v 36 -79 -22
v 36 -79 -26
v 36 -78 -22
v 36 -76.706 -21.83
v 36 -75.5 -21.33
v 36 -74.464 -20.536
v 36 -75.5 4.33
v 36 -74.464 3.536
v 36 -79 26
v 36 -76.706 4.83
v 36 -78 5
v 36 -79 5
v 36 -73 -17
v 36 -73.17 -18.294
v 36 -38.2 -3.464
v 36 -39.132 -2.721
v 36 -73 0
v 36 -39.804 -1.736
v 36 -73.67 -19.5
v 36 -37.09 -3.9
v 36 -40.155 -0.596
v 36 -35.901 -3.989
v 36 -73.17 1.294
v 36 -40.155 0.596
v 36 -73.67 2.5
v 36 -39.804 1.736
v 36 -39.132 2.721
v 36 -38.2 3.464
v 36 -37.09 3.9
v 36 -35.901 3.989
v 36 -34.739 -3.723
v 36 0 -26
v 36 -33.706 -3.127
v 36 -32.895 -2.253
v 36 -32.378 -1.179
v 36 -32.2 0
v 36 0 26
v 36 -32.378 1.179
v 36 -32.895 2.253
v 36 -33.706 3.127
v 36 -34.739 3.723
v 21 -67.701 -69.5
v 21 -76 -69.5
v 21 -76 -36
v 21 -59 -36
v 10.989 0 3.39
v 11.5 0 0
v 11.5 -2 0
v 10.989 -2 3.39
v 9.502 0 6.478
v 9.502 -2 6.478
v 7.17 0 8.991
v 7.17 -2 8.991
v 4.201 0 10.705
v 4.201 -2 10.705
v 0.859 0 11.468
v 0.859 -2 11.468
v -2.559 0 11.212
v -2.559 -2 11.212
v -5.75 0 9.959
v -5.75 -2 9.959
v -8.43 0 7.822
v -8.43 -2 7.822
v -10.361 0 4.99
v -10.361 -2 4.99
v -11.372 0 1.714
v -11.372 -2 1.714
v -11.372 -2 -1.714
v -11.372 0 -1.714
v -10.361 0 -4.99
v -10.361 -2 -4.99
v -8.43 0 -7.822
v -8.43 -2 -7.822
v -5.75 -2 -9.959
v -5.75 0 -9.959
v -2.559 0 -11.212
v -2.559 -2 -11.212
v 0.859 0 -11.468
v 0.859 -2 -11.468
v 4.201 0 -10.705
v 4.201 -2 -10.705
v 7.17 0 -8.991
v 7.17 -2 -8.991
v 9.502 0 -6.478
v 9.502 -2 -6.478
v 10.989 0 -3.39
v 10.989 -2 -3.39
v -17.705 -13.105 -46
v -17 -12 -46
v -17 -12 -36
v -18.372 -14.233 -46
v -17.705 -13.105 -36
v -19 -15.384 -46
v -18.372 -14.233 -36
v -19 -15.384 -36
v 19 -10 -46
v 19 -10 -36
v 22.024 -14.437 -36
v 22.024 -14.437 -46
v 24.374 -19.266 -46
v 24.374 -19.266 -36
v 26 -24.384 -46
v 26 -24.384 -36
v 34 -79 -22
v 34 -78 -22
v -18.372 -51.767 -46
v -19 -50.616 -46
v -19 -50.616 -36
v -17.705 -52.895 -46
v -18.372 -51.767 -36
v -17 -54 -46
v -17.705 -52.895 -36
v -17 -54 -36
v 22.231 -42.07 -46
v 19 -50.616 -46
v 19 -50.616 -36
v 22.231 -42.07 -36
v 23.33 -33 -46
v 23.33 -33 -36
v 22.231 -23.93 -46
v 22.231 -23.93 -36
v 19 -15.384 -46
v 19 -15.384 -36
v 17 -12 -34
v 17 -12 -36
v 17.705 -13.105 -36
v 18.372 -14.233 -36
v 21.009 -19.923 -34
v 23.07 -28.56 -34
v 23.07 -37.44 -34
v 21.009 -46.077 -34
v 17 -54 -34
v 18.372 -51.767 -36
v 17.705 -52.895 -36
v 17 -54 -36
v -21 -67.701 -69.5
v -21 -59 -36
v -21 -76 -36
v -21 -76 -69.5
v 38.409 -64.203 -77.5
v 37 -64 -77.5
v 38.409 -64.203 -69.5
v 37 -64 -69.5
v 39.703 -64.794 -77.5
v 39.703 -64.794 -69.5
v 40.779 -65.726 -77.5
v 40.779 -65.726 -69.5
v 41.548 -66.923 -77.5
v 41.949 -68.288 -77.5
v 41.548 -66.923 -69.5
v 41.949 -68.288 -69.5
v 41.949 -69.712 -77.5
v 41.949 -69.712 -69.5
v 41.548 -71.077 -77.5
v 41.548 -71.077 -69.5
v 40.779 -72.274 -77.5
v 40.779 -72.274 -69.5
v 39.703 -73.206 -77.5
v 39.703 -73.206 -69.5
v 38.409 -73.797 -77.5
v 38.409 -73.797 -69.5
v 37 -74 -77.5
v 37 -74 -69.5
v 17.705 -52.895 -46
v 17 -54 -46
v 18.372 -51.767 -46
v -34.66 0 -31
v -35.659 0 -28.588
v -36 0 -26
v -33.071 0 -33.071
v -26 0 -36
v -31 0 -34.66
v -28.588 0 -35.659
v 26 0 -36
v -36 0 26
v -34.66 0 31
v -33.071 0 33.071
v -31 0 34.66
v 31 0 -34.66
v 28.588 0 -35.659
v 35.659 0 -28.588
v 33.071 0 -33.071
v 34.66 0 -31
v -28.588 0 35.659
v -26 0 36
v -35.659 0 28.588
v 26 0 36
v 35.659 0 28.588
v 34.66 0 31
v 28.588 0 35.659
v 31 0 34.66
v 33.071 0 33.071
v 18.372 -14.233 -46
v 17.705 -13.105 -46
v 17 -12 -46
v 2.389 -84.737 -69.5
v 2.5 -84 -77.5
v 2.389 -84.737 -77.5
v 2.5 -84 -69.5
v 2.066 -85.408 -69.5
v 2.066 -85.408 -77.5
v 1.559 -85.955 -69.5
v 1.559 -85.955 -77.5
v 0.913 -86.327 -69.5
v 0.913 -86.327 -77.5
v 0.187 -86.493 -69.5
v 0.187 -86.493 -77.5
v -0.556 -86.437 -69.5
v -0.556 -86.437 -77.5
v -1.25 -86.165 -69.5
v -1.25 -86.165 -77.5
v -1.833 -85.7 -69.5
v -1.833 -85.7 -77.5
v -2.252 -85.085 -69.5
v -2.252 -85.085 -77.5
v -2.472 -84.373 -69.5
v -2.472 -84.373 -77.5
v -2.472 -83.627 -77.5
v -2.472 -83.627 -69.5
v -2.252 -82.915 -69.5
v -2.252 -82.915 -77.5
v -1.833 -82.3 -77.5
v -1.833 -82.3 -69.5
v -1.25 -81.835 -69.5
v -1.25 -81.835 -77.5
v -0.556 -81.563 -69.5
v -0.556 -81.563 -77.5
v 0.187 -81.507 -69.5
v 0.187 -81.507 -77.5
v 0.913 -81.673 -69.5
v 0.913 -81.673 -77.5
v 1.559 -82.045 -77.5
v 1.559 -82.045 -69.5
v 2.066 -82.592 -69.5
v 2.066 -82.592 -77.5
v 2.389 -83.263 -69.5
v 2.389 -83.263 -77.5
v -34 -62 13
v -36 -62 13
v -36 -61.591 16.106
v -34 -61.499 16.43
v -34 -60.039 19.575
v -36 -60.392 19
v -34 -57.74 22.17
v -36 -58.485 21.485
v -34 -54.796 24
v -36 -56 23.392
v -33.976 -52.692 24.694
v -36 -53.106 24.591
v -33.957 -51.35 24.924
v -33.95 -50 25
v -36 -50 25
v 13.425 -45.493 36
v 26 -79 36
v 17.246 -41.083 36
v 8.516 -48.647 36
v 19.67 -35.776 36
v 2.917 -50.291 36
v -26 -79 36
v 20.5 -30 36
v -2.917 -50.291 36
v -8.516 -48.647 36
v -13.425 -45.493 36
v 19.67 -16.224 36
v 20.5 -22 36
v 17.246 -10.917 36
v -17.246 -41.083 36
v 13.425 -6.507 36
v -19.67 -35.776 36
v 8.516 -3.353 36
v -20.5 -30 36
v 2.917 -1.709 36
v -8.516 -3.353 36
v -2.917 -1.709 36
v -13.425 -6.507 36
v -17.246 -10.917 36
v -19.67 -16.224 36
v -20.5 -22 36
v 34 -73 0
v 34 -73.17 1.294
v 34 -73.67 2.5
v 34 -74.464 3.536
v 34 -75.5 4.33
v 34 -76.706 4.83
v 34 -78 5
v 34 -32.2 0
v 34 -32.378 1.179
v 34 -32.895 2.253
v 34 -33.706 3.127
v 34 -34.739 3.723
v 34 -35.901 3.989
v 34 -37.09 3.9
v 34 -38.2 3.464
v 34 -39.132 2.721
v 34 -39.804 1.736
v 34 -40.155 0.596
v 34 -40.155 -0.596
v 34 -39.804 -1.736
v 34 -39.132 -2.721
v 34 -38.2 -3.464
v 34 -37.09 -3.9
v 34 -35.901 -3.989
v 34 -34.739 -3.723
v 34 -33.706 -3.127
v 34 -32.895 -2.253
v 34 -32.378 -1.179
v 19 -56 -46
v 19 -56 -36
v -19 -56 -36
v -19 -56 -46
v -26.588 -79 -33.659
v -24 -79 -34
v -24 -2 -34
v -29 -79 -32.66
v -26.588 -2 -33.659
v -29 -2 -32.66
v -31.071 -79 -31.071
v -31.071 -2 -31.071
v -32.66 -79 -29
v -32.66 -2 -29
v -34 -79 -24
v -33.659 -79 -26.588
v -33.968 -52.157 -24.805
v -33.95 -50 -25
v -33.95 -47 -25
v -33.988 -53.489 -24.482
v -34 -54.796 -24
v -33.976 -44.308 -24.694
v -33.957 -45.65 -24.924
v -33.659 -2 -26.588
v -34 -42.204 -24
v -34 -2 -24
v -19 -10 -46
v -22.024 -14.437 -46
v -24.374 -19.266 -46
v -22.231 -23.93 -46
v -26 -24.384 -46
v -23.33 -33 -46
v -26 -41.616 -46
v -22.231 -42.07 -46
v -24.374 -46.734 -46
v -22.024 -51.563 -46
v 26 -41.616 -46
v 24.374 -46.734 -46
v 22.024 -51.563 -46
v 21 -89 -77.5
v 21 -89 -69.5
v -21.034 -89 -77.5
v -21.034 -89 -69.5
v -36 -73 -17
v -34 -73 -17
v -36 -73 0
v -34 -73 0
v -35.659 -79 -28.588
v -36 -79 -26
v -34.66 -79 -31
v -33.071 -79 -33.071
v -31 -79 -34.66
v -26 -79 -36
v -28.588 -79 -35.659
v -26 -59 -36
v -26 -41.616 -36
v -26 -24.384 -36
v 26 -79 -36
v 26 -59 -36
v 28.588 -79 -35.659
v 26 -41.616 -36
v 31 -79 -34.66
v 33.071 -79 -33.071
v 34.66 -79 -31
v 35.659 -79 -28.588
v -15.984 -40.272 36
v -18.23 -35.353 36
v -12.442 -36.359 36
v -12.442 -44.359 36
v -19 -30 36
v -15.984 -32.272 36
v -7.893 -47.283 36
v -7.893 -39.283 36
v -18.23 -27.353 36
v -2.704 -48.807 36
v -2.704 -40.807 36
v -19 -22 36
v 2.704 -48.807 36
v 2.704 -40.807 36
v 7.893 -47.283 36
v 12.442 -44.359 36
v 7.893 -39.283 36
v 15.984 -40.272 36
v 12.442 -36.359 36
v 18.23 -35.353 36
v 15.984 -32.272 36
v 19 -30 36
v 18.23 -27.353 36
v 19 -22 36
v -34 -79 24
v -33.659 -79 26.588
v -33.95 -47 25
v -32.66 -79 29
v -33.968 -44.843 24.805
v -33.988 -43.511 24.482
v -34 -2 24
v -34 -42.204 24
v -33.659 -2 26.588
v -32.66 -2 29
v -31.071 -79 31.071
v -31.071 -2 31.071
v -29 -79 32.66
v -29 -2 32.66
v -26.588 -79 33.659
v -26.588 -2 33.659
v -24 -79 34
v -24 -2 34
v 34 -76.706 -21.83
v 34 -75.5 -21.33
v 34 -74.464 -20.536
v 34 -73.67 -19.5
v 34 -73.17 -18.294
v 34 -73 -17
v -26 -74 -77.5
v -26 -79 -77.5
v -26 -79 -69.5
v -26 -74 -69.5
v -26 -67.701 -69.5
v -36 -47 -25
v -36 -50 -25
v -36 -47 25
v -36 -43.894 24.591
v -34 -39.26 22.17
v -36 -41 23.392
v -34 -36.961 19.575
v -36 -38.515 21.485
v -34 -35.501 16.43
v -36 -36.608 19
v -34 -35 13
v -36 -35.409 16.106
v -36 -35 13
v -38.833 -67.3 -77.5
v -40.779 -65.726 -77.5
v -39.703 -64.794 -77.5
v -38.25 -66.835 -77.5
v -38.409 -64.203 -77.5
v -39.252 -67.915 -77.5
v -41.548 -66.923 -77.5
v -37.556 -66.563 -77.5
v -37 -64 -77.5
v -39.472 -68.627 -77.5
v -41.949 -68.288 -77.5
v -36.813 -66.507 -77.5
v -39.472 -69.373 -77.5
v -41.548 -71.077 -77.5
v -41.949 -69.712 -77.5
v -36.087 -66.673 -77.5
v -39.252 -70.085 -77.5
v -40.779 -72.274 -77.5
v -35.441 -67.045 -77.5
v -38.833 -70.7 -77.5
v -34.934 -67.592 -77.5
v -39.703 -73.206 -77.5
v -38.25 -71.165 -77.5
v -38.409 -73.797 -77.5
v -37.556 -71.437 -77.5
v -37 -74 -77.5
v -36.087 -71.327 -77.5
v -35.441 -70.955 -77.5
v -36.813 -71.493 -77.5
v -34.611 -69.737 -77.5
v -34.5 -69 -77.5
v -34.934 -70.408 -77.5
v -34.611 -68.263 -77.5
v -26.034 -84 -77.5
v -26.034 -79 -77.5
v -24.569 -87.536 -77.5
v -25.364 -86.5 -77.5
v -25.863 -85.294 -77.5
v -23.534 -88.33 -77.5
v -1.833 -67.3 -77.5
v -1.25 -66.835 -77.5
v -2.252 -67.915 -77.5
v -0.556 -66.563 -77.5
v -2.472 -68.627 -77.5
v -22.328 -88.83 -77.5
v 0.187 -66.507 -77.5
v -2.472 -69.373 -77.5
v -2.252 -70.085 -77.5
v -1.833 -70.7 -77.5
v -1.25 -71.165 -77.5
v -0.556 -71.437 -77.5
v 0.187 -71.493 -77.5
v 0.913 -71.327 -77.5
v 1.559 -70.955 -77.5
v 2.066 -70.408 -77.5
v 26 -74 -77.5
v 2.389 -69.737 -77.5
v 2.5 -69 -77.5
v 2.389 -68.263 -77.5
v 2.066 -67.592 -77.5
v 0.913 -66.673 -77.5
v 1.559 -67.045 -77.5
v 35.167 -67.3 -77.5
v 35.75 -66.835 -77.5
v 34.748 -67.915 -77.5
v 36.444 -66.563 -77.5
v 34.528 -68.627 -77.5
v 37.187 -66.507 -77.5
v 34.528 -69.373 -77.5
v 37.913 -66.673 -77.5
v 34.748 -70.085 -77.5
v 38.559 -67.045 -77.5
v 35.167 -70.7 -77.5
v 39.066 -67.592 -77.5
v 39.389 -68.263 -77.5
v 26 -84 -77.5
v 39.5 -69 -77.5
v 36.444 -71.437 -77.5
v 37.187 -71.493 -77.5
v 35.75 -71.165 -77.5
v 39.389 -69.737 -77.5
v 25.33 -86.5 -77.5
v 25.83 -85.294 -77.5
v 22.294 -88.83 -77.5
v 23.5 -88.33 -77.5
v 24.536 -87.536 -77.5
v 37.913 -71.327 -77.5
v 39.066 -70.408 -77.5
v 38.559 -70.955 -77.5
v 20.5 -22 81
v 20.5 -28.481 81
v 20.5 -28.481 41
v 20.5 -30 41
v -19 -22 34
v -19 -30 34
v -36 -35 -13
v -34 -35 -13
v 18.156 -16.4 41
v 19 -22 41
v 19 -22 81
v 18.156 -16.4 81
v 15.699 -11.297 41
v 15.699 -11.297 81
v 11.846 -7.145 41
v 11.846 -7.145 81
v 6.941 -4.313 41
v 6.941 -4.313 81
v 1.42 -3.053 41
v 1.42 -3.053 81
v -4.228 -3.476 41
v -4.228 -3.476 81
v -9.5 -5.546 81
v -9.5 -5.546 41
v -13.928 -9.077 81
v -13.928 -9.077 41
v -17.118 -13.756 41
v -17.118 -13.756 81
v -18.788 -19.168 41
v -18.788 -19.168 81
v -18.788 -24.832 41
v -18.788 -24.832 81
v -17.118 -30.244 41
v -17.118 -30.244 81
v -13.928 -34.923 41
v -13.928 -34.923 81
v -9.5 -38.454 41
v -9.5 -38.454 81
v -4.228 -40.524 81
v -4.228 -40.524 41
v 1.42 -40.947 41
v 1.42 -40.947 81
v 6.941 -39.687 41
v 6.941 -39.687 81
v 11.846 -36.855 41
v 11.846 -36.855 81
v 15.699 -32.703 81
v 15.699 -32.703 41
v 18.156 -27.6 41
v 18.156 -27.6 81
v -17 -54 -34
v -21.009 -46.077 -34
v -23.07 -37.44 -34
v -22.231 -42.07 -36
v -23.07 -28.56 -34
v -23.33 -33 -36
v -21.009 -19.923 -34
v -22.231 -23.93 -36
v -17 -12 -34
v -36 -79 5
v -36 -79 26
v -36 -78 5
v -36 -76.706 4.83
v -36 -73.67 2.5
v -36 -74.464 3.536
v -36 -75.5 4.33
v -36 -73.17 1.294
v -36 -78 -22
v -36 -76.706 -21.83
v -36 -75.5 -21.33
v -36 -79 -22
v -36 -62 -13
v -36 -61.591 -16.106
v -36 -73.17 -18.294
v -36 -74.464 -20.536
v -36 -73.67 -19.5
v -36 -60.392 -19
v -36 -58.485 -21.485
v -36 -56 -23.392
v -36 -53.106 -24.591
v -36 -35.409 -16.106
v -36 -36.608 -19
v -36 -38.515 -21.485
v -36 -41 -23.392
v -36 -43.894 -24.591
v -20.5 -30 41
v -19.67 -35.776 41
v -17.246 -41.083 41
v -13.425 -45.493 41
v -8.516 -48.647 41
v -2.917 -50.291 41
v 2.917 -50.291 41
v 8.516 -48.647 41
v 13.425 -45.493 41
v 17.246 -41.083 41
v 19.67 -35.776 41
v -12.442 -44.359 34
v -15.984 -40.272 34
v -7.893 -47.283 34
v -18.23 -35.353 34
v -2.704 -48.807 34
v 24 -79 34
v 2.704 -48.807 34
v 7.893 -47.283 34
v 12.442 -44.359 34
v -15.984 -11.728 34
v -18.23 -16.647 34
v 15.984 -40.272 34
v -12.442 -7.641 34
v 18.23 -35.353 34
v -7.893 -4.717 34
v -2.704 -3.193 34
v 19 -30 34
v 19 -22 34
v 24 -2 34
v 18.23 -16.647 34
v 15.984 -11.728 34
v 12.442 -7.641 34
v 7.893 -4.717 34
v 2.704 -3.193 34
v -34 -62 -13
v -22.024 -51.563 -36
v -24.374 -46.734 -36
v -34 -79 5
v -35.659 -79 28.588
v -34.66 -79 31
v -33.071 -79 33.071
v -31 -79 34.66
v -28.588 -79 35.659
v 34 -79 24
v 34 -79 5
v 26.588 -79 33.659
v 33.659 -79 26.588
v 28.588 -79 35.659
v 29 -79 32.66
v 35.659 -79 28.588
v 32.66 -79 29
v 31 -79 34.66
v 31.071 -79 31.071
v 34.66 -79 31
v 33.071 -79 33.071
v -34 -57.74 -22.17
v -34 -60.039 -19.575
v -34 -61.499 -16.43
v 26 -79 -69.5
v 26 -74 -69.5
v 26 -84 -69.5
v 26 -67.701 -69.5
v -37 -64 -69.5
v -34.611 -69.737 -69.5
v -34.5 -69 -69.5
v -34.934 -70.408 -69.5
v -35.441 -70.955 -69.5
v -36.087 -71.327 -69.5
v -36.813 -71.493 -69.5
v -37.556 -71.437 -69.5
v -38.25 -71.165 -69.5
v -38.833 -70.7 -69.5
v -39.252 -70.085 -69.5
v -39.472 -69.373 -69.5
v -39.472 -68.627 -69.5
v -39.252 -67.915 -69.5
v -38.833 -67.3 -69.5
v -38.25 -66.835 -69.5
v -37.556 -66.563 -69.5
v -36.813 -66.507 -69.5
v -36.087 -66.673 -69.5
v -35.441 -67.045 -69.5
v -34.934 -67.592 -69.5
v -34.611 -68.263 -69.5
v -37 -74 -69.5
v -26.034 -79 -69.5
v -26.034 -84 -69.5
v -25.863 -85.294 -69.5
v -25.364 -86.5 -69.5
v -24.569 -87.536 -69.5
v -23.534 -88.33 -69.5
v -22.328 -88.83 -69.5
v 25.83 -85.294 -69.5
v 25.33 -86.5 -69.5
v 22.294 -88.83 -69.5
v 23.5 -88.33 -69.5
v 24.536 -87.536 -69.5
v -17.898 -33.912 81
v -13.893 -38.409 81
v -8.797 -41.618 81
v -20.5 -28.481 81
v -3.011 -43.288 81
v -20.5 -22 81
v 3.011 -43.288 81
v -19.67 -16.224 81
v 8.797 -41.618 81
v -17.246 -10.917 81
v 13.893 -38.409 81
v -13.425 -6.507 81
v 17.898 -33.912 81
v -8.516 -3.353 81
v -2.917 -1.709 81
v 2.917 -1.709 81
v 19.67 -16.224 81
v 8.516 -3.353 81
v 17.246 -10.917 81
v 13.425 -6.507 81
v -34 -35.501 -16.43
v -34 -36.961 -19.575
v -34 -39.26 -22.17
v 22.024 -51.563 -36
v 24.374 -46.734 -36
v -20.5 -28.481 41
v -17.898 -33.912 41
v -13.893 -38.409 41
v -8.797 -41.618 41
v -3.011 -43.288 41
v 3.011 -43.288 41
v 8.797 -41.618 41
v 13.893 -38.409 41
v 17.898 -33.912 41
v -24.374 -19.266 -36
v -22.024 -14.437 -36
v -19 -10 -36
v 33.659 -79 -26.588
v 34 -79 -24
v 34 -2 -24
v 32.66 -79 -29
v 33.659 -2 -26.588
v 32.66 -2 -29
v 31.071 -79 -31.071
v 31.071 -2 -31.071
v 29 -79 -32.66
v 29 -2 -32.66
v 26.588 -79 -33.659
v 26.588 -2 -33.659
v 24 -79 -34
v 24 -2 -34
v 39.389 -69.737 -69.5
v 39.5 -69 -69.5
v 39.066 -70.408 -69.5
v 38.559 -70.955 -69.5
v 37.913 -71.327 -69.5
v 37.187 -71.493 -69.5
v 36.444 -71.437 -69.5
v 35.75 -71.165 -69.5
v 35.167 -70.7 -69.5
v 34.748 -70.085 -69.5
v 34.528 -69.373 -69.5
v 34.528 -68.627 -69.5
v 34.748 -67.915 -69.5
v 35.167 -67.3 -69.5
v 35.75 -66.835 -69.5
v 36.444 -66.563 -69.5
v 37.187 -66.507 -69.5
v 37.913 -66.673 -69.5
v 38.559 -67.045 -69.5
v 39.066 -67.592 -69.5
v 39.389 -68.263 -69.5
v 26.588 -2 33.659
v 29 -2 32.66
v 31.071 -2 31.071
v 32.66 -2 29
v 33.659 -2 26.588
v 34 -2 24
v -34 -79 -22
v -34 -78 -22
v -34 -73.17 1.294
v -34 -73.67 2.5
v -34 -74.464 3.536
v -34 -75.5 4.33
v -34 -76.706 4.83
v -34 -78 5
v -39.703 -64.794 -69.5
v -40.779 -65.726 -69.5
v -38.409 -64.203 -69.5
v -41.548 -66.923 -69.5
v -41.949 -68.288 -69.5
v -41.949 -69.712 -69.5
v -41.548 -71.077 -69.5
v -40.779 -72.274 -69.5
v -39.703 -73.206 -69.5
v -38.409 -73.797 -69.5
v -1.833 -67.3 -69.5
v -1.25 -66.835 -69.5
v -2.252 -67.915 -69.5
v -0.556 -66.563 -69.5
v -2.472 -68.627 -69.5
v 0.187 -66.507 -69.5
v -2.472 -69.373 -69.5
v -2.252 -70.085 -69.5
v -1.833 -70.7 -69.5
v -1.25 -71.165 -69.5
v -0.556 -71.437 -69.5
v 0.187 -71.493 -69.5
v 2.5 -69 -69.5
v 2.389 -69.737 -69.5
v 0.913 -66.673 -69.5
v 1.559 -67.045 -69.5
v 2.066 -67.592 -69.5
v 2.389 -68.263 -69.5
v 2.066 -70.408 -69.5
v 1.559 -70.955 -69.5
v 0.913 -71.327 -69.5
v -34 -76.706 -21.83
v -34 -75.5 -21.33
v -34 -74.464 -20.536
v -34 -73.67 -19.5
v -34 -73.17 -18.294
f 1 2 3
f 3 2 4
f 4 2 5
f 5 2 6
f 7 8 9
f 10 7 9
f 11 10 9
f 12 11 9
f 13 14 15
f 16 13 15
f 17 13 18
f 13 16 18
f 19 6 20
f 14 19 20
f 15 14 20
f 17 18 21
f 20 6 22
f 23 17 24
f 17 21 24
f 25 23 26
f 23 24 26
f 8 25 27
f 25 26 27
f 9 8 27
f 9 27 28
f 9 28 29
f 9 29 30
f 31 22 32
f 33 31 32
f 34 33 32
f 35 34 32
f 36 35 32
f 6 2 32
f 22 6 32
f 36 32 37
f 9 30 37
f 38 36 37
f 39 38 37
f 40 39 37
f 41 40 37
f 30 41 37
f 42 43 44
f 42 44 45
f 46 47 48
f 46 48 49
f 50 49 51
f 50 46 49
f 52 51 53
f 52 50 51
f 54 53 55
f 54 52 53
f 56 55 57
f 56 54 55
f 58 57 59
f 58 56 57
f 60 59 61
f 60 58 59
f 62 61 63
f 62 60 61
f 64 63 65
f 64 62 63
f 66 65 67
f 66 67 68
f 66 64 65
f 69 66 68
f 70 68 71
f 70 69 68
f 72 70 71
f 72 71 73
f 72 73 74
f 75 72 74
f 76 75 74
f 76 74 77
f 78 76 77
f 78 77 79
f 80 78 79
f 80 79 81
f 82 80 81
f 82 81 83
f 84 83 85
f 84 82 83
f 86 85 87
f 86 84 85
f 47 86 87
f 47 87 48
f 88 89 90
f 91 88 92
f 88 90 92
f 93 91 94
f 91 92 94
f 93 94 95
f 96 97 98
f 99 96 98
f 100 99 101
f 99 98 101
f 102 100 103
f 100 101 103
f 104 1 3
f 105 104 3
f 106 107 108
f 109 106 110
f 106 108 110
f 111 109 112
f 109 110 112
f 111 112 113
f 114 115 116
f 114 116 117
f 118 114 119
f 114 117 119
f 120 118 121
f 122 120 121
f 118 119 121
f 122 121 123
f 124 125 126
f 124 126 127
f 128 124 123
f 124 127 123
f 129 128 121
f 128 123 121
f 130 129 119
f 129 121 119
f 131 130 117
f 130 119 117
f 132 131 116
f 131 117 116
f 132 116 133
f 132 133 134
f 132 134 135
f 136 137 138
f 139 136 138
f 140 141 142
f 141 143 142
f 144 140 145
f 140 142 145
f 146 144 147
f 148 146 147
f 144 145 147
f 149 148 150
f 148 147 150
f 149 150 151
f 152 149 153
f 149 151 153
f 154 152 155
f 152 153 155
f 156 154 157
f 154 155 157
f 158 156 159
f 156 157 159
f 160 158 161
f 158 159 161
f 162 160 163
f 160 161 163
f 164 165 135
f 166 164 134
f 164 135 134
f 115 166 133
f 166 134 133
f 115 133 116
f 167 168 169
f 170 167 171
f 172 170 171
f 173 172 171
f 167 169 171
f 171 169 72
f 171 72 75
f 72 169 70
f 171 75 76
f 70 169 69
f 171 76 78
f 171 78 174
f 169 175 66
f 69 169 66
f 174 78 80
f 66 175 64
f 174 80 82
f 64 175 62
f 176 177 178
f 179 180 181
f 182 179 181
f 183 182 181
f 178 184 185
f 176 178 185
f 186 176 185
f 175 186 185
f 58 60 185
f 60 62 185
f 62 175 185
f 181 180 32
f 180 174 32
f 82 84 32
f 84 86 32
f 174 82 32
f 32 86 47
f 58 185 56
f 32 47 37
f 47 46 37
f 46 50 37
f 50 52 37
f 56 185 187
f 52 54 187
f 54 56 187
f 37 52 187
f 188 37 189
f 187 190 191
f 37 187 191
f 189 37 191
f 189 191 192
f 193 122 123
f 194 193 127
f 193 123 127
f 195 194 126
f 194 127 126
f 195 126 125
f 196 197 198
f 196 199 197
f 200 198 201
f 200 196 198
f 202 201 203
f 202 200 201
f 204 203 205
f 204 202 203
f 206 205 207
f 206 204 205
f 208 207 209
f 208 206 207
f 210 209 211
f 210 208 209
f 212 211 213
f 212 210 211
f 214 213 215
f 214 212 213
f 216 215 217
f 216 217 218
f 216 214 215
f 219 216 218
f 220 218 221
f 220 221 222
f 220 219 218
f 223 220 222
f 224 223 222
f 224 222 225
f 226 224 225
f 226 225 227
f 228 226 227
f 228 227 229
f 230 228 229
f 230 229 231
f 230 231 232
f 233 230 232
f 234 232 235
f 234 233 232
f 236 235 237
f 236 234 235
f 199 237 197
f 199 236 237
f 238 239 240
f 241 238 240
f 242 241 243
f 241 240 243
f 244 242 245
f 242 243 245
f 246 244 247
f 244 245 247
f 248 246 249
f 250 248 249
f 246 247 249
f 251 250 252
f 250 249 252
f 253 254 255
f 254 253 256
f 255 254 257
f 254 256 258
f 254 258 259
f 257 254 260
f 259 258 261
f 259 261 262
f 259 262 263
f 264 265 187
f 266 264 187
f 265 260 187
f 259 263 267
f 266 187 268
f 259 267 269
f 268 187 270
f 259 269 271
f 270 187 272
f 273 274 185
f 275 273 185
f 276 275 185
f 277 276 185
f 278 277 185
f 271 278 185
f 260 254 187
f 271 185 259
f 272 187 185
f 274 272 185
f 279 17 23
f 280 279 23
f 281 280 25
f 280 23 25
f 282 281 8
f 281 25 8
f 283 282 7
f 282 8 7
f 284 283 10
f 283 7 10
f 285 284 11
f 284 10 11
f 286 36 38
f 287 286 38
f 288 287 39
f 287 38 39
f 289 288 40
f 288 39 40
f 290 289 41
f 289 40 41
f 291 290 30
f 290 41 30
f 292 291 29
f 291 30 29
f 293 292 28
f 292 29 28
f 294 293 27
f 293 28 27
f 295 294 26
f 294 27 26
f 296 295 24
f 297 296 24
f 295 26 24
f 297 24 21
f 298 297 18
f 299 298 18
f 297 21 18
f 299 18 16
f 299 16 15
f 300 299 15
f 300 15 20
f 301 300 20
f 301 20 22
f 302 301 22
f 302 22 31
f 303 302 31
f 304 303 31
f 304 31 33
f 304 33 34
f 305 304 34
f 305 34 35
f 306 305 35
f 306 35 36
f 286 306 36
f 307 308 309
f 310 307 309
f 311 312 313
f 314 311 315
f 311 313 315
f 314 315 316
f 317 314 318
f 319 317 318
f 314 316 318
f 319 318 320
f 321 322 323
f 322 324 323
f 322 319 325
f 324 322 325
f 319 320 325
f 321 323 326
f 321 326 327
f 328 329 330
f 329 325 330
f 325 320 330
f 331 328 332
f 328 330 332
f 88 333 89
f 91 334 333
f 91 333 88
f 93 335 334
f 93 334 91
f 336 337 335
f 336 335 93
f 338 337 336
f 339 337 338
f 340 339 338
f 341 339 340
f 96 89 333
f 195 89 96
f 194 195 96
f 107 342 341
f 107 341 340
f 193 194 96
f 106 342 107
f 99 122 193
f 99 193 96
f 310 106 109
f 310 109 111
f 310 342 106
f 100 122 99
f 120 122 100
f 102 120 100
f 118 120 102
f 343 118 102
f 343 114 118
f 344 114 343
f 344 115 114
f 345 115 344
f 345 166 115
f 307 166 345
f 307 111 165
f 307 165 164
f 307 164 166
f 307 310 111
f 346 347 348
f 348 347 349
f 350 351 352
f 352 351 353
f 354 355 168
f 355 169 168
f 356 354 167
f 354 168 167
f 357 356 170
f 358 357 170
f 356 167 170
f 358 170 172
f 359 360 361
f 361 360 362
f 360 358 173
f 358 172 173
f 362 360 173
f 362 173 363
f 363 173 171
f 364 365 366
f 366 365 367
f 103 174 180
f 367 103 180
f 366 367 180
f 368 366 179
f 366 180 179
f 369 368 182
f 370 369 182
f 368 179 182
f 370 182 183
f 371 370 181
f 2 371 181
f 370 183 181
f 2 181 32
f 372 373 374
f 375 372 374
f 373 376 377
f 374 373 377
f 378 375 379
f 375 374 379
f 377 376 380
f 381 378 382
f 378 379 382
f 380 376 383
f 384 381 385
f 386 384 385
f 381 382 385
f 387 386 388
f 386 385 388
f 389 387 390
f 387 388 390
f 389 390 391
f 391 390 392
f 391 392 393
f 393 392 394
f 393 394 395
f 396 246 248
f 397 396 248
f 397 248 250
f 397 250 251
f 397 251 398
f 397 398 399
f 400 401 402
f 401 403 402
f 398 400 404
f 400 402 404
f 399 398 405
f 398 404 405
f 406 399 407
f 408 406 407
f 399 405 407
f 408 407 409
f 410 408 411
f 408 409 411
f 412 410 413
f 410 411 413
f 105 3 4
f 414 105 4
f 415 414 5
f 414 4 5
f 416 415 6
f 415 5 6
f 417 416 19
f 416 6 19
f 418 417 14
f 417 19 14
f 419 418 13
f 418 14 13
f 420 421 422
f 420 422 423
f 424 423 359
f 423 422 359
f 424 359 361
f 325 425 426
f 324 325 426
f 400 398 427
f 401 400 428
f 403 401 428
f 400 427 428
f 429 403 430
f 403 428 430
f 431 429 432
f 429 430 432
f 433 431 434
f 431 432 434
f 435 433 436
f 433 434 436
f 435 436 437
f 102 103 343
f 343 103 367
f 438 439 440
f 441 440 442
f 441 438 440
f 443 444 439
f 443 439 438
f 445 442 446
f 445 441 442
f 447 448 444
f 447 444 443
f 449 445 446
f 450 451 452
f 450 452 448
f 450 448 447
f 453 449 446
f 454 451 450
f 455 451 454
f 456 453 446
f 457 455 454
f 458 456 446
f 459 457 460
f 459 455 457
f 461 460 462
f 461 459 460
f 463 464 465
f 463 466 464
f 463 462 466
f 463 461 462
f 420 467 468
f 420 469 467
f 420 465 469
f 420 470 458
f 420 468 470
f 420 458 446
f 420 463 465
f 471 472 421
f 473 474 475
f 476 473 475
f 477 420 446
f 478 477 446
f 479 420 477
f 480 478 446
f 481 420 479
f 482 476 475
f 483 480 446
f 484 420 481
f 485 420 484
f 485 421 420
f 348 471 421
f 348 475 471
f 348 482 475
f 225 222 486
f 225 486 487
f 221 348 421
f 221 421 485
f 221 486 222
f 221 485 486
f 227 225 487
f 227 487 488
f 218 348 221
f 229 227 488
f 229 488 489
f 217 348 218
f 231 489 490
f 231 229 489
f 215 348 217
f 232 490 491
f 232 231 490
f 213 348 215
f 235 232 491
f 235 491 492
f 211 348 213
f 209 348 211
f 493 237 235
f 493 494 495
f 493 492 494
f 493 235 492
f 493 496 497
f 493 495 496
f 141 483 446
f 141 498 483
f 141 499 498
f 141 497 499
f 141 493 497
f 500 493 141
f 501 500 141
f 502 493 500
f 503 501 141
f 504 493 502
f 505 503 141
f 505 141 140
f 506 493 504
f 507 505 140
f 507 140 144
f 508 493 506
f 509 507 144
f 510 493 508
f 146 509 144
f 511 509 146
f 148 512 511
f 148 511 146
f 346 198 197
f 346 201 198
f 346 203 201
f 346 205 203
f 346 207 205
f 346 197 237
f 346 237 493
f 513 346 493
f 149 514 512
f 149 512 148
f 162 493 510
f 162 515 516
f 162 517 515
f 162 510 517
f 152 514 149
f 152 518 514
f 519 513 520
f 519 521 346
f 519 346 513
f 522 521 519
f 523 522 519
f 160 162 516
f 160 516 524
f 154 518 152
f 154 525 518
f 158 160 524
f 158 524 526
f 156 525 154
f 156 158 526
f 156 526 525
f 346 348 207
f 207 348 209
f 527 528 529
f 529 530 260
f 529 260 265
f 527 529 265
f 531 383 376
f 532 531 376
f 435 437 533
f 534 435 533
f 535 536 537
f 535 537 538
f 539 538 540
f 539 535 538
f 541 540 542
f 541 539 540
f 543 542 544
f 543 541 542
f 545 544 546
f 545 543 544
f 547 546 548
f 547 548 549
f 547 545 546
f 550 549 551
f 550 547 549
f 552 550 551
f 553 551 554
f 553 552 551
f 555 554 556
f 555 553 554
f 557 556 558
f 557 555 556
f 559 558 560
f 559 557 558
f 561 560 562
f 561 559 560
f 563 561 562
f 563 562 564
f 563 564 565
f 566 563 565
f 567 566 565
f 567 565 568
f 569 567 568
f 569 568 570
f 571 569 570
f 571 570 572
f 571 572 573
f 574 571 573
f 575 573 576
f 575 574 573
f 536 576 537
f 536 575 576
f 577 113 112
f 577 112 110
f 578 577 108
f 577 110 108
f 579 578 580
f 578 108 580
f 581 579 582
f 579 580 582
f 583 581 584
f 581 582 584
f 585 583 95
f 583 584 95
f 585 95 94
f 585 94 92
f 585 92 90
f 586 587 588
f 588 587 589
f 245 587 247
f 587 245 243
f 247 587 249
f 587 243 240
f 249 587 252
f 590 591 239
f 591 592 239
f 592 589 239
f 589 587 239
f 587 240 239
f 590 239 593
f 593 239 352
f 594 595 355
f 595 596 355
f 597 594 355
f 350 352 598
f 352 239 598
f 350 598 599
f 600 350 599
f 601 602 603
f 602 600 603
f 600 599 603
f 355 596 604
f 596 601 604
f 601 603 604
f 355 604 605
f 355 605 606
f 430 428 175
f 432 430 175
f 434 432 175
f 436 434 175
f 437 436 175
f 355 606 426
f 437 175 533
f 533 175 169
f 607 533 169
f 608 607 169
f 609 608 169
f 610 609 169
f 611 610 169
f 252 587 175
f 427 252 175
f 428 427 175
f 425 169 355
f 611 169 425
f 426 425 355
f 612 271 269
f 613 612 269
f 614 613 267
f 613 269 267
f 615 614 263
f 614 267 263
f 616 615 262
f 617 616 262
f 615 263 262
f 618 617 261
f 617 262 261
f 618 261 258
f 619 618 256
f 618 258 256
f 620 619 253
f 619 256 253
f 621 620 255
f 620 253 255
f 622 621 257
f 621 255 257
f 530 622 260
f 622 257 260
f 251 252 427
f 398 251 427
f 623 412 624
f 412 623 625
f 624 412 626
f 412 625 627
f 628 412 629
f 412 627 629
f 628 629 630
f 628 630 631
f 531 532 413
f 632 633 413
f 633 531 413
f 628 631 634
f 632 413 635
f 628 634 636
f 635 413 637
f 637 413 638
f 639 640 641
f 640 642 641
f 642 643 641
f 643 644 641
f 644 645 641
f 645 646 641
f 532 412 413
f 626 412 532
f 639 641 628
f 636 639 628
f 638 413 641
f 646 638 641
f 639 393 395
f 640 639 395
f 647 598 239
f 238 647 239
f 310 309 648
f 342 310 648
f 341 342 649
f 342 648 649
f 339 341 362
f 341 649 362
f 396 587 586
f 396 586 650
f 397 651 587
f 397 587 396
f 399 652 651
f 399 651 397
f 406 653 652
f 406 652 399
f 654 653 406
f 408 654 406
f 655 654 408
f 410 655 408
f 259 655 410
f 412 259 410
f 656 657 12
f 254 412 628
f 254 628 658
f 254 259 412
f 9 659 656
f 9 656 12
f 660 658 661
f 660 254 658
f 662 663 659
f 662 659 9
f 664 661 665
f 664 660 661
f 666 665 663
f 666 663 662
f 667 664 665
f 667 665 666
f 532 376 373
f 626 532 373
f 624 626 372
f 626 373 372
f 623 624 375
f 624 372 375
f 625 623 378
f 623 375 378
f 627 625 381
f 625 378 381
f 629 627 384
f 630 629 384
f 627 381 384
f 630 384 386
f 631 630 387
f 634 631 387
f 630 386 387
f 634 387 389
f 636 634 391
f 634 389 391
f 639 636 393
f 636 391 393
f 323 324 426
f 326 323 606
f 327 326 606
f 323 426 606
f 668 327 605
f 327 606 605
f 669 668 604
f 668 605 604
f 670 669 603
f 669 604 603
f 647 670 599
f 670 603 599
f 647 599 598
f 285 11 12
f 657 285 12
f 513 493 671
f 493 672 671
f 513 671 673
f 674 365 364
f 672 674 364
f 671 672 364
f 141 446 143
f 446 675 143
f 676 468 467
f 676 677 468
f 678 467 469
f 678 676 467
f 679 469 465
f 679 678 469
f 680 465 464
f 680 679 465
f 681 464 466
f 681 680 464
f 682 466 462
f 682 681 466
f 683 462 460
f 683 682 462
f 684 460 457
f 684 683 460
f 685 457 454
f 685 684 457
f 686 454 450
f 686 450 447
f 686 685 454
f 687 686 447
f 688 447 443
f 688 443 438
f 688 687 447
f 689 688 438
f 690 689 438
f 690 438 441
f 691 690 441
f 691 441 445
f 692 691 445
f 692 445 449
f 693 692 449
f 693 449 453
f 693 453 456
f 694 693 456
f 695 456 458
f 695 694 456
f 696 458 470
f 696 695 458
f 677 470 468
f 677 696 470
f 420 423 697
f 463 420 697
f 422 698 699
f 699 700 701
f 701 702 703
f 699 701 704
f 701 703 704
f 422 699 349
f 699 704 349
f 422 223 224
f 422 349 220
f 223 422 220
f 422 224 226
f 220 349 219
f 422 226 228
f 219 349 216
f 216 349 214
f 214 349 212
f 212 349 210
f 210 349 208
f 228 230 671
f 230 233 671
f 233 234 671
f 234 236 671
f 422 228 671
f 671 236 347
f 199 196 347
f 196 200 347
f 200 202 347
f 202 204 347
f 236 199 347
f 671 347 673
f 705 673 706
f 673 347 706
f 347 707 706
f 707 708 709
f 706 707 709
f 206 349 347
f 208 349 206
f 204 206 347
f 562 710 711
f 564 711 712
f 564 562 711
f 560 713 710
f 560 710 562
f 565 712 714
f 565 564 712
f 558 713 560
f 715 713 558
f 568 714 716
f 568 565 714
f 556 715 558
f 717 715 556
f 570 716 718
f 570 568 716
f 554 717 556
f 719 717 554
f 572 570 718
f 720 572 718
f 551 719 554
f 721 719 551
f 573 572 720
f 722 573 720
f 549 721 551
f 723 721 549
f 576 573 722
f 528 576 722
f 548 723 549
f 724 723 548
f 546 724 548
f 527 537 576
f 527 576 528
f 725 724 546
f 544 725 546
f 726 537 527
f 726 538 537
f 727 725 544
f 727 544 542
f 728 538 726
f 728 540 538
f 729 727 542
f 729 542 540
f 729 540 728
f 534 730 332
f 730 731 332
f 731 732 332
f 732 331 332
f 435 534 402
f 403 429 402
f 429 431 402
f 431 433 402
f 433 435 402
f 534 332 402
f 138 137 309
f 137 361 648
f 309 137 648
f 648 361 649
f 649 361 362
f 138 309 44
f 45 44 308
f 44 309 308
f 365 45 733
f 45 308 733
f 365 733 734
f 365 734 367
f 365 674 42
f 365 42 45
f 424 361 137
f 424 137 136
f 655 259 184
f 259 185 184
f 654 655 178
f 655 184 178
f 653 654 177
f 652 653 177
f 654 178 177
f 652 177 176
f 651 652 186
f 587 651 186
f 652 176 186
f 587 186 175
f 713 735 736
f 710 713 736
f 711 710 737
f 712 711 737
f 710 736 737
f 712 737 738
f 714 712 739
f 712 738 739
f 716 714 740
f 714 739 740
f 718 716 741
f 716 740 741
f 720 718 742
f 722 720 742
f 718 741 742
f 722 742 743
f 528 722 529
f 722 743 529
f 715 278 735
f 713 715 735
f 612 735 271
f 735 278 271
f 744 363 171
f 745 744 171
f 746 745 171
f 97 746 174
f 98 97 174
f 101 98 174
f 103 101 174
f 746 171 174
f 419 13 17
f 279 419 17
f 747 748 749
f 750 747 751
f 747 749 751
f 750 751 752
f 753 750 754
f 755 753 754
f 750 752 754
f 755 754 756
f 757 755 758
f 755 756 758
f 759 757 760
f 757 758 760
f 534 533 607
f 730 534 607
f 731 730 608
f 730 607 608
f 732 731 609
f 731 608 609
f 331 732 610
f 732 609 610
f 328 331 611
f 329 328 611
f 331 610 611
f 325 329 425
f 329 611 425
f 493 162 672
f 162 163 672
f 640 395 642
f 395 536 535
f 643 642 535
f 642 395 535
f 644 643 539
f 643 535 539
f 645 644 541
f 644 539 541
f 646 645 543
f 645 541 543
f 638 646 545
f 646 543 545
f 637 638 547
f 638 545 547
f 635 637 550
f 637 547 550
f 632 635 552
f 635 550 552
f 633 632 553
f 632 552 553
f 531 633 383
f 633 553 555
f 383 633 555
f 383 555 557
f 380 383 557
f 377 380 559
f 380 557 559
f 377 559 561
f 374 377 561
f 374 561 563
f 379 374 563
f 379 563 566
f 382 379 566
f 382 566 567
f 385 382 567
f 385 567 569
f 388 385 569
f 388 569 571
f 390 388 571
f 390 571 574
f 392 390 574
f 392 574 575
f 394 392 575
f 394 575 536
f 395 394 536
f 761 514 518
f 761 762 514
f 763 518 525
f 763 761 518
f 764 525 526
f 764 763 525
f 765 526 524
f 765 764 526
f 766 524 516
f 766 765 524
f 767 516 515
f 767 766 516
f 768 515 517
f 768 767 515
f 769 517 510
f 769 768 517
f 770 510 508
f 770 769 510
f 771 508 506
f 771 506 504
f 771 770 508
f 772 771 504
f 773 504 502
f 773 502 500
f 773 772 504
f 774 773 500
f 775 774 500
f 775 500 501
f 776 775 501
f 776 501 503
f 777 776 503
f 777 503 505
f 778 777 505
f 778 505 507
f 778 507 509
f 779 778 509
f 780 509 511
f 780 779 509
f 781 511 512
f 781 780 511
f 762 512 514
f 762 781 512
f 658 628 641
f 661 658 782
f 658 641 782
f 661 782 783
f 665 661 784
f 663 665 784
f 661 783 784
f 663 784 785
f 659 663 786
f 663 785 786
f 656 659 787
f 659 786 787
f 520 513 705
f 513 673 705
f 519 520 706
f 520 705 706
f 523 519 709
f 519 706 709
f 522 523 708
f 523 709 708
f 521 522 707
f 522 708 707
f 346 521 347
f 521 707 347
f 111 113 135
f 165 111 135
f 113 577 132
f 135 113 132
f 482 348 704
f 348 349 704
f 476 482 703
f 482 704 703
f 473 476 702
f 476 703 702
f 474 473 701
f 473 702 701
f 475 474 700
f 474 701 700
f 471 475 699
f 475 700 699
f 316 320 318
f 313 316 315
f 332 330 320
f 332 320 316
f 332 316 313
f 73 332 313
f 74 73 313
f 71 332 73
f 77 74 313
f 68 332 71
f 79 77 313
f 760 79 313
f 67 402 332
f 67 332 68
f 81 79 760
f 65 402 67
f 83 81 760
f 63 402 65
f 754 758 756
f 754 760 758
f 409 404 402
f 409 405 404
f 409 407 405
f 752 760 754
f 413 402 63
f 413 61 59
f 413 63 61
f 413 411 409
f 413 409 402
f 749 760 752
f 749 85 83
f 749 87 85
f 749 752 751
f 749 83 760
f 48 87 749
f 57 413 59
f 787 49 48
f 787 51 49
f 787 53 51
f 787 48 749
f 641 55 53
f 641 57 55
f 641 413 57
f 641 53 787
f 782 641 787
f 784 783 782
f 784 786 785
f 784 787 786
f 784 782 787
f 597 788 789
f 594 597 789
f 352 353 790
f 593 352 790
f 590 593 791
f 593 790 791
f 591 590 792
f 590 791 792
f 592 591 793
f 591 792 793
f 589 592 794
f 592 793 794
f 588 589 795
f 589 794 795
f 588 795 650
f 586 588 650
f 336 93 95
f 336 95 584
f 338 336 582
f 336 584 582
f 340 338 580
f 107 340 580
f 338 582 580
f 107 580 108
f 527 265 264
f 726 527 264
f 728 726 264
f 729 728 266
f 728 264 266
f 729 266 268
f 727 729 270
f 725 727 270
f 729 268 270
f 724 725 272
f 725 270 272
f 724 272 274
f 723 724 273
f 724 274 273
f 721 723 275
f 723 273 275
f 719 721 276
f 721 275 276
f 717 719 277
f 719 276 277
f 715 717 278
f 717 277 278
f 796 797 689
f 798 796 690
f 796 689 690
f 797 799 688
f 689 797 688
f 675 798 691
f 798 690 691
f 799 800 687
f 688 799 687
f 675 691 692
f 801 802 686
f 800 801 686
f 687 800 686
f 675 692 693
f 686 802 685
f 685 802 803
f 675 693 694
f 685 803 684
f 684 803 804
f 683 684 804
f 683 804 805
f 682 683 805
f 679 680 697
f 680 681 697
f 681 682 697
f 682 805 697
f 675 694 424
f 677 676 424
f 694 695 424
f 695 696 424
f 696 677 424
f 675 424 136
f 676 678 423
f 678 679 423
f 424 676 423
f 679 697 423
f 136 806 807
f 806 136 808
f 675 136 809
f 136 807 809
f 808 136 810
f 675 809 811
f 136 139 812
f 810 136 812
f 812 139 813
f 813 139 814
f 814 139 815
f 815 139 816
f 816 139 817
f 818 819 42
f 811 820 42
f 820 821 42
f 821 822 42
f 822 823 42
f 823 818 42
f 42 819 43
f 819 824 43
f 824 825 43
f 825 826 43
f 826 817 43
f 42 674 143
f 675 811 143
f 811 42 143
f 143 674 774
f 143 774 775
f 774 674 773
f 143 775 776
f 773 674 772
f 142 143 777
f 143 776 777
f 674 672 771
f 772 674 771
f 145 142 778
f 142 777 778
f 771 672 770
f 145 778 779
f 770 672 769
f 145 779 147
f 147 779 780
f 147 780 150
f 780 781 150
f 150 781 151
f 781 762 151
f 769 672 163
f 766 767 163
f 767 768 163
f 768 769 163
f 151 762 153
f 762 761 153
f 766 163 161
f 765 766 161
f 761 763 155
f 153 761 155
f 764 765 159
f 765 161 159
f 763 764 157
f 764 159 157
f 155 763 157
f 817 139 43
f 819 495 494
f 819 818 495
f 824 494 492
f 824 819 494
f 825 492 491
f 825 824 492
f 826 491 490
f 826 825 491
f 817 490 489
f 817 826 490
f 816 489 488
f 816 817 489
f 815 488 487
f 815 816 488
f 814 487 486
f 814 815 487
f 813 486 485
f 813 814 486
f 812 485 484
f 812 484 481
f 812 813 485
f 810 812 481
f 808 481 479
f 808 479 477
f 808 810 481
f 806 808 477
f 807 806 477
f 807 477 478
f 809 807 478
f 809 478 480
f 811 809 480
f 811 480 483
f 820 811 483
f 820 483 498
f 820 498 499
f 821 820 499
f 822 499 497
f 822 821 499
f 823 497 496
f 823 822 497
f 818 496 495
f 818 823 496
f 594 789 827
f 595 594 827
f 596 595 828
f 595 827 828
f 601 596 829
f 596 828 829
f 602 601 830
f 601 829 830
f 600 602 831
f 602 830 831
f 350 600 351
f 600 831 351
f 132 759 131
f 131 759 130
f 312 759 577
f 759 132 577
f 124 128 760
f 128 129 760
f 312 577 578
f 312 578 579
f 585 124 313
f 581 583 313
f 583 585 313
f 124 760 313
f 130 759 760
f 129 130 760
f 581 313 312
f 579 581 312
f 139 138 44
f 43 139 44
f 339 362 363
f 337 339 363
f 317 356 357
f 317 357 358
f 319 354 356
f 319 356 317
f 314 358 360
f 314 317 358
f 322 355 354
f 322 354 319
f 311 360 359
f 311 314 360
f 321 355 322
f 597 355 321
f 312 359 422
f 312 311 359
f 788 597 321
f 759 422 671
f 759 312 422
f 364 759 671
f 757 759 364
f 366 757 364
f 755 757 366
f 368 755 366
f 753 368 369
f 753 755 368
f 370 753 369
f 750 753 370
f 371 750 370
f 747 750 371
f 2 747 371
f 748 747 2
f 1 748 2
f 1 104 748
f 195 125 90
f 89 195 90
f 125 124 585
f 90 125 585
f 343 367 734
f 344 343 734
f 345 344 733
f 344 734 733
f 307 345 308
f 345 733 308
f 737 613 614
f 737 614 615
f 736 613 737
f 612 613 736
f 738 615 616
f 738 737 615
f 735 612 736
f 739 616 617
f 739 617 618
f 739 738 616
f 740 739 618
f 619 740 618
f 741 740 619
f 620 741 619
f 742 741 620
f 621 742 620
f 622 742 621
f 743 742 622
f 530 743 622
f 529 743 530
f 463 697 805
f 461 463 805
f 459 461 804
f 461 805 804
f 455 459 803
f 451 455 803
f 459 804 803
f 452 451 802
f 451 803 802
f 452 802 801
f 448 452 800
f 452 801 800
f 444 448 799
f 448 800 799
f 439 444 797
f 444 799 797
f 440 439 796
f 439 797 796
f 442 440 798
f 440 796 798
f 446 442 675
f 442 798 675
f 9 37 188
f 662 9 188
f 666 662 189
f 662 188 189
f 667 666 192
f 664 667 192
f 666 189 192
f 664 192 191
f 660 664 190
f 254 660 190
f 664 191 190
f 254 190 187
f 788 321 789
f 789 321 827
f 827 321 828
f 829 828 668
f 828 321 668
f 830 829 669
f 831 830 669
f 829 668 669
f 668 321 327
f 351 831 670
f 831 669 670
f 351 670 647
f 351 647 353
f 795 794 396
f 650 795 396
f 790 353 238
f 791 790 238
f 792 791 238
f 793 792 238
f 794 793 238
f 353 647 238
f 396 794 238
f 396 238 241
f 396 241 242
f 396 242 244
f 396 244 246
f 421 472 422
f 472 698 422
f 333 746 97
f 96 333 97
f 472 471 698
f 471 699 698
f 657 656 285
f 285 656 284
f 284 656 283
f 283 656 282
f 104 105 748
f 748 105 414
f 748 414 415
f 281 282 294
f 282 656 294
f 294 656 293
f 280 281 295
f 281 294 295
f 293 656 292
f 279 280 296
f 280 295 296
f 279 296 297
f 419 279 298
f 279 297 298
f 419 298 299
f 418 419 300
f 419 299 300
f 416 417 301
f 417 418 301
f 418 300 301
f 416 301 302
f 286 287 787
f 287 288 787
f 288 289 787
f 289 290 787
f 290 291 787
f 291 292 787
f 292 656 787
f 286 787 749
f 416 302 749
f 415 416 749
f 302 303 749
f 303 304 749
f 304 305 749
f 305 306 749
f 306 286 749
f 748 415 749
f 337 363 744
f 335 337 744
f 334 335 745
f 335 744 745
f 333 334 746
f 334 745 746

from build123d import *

# Parameters (mm, degrees)
F0_R      = 11.5
F1_DEPTH  = 2
F3_DEPTH  = 77
F5_DEPTH  = 3
F7_DEPTH  = 3
F9_DEPTH  = 5
F11_DEPTH = 3
F12_R     = 19
F13_DEPTH = 8
F14_R     = 19
F15_DEPTH = 40
F16_W     = 52
F16_H     = 3
F17_DEPTH = 38.5
F19_DEPTH = 3
F21_DEPTH = 10
F22_W     = 3
F22_H     = 38.5
F23_DEPTH = 5
F25_R     = 2.5
F25_W     = 47
F25_H     = 2
F26_DEPTH = 5
F27_DEPTH = 1
F29_DEPTH = 75
F30_DEPTH = 2
F24_W     = 3
F24_H     = 38.5
F31_DEPTH = 5
F32_R     = 4
F33_DEPTH = 3


with BuildPart() as f1:
    # F0 (on Front) → F1 (new body)
    with BuildSketch(Plane.XZ):
        with BuildLine():
            Line((26, 36), (-26, 36))
            ThreePointArc((-26, 36), (-33.0710678119, 33.0710678119), (-36, 26))
            Line((-36, 26), (-36, -26))
            ThreePointArc((-36, -26), (-33.0710678119, -33.0710678119), (-26, -36))
            Line((-26, -36), (26, -36))
            ThreePointArc((26, -36), (33.0710678119, -33.0710678119), (36, -26))
            Line((36, -26), (36, 26))
            ThreePointArc((36, 26), (33.0710678119, 33.0710678119), (26, 36))
        make_face()
        with BuildLine():
            Line((24, -34), (-24, -34))
            ThreePointArc((-24, -34), (-31.0710678119, -31.0710678119), (-34, -24))
            Line((-34, -24), (-34, 24))
            ThreePointArc((-34, 24), (-31.0710678119, 31.0710678119), (-24, 34))
            Line((-24, 34), (24, 34))
            ThreePointArc((24, 34), (31.0710678119, 31.0710678119), (34, 24))
            Line((34, 24), (34, -24))
            ThreePointArc((34, -24), (31.0710678119, -31.0710678119), (24, -34))
        make_face(mode=Mode.SUBTRACT)
        with BuildLine():
            ThreePointArc((-34, -24), (-31.0710678119, -31.0710678119), (-24, -34))
            Line((-24, -34), (24, -34))
            ThreePointArc((24, -34), (31.0710678119, -31.0710678119), (34, -24))
            Line((34, -24), (34, 24))
            ThreePointArc((34, 24), (31.0710678119, 31.0710678119), (24, 34))
            Line((24, 34), (-24, 34))
            ThreePointArc((-24, 34), (-31.0710678119, 31.0710678119), (-34, 24))
            Line((-34, 24), (-34, -24))
        make_face()
        Circle(F0_R, mode=Mode.SUBTRACT)
    extrude(amount=F1_DEPTH)

    # F2 (on face) → F3 (join)
    with BuildSketch(Plane.XZ.offset(2)):
        with BuildLine():
            Line((26, 36), (-26, 36))
            ThreePointArc((-26, 36), (-33.0710678119, 33.0710678119), (-36, 26))
            Line((-36, 26), (-36, -26))
            ThreePointArc((-36, -26), (-33.0710678119, -33.0710678119), (-26, -36))
            Line((-26, -36), (26, -36))
            ThreePointArc((26, -36), (33.0710678119, -33.0710678119), (36, -26))
            Line((36, -26), (36, 26))
            ThreePointArc((36, 26), (33.0710678119, 33.0710678119), (26, 36))
        make_face()
        with BuildLine():
            Line((24, -34), (-24, -34))
            ThreePointArc((-24, -34), (-31.0710678119, -31.0710678119), (-34, -24))
            Line((-34, -24), (-34, 24))
            ThreePointArc((-34, 24), (-31.0710678119, 31.0710678119), (-24, 34))
            Line((-24, 34), (24, 34))
            ThreePointArc((24, 34), (31.0710678119, 31.0710678119), (34, 24))
            Line((34, 24), (34, -24))
            ThreePointArc((34, -24), (31.0710678119, -31.0710678119), (24, -34))
        make_face(mode=Mode.SUBTRACT)
    extrude(amount=F3_DEPTH)

    # F4 (on face) → F5 (cut)
    with BuildSketch(Plane(origin=(-36, 0, 0), x_dir=(0, -1, 0), z_dir=(-1, 0, 0))):
        with BuildLine():
            ThreePointArc((62, 13), (58.4852813742, 21.4852813742), (50, 25))
            Line((50, 25), (47, 25))
            ThreePointArc((47, 25), (38.5147186258, 21.4852813742), (35, 13))
            Line((35, 13), (35, -13))
            ThreePointArc((35, -13), (38.5147186258, -21.4852813742), (47, -25))
            Line((47, -25), (50, -25))
            ThreePointArc((50, -25), (58.4852813742, -21.4852813742), (62, -13))
            Line((62, -13), (62, 13))
        make_face()
    extrude(amount=-F5_DEPTH, mode=Mode.SUBTRACT)

    # F6 (on face) → F7 (cut)
    with BuildSketch(Plane.XY.offset(36)):
        with BuildLine():
            Line((19, -30), (19, -22))
            ThreePointArc((19, -22), (0, -3), (-19, -22))
            Line((-19, -22), (-19, -30))
            ThreePointArc((-19, -30), (0, -49), (19, -30))
        make_face()
    extrude(amount=-F7_DEPTH, mode=Mode.SUBTRACT)

    # F8 (on face) → F9 (join)
    with BuildSketch(Plane.XY.offset(36)):
        with BuildLine():
            Line((-20.5, -22), (-20.5, -30))
            ThreePointArc((-20.5, -30), (0, -50.5), (20.5, -30))
            Line((20.5, -30), (20.5, -22))
            ThreePointArc((20.5, -22), (0, -1.5), (-20.5, -22))
        make_face()
        with BuildLine():
            ThreePointArc((-19, -22), (0, -3), (19, -22))
            Line((19, -22), (19, -22.3025978408))
            Line((19, -22.3025978408), (19, -29.6974021592))
            Line((19, -29.6974021592), (19, -30))
            ThreePointArc((19, -30), (0, -49), (-19, -30))
            Line((-19, -30), (-19, -22))
        make_face(mode=Mode.SUBTRACT)
        with BuildLine():
            Line((19, -22.3025978408), (19, -22))
            ThreePointArc((19, -22), (0, -3), (-19, -22))
            Line((-19, -22), (-19, -30))
            ThreePointArc((-19, -30), (0, -49), (19, -30))
            Line((19, -30), (19, -29.6974021592))
            Line((19, -29.6974021592), (19, -22.3025978408))
        make_face()
    extrude(amount=F9_DEPTH)

    # F10 (on face) → F11 (join)
    with BuildSketch(Plane.XY.offset(36)):
        with BuildLine():
            Line((20.5, -30), (20.5, -22))
            ThreePointArc((20.5, -22), (0, -1.5), (-20.5, -22))
            Line((-20.5, -22), (-20.5, -30))
            ThreePointArc((-20.5, -30), (0, -50.5), (20.5, -30))
        make_face()
    extrude(amount=F11_DEPTH)

    # F12 (on face) → F13 (cut)
    with BuildSketch(Plane.XY.offset(41)):
        with Locations((0, -22)):
            Circle(F12_R)
    extrude(amount=-F13_DEPTH, mode=Mode.SUBTRACT)

    # F14 (on face) → F15 (join)
    with BuildSketch(Plane.XY.offset(41)):
        with BuildLine():
            Line((-20.5, -22), (-20.5, -28.4807406984))
            ThreePointArc((-20.5, -28.4807406984), (0, -43.5), (20.5, -28.4807406984))
            Line((20.5, -28.4807406984), (20.5, -22))
            ThreePointArc((20.5, -22), (0, -1.5), (-20.5, -22))
        make_face()
        with Locations((0, -22)):
            Circle(F14_R, mode=Mode.SUBTRACT)
    extrude(amount=F15_DEPTH)

    # F16 (on face) → F17 (join)
    with BuildSketch(Plane(origin=(0, 0, -36), x_dir=(1, 0, 0), z_dir=(0, 0, -1))):
        with Locations((0, 77.5)):
            Rectangle(F16_W, F16_H)
    extrude(amount=F17_DEPTH)

    # F18 (on face) → F19 (cut)
    with BuildSketch(Plane(origin=(0, 0, -36), x_dir=(1, 0, 0), z_dir=(0, 0, -1))):
        with BuildLine():
            Line((-17, 12), (17, 12))
            ThreePointArc((17, 12), (23.3298247558, 33), (17, 54))
            Line((17, 54), (-17, 54))
            ThreePointArc((-17, 54), (-23.3298247558, 33), (-17, 12))
        make_face()
    extrude(amount=-F19_DEPTH, mode=Mode.SUBTRACT)

    # F20 (on face) → F21 (join)
    with BuildSketch(Plane(origin=(0, 0, -36), x_dir=(1, 0, 0), z_dir=(0, 0, -1))):
        with BuildLine():
            ThreePointArc((19, 50.6158820109), (23.3298247558, 33), (19, 15.3841179891))
            Line((19, 15.3841179891), (19, 10))
            ThreePointArc((19, 10), (23.2866263695, 16.8090036252), (26, 24.3836521016))
            Line((26, 24.3836521016), (26, 41.6163478984))
            ThreePointArc((26, 41.6163478984), (23.2866263695, 49.1909963748), (19, 56))
            Line((19, 56), (19, 50.6158820109))
        make_face()
        with BuildLine():
            Line((-19, 56), (-19, 50.6158820109))
            ThreePointArc((-19, 50.6158820109), (-18.0437883513, 52.3338197434), (-17, 54))
            Line((-17, 54), (17, 54))
            ThreePointArc((17, 54), (18.0437883513, 52.3338197434), (19, 50.6158820109))
            Line((19, 50.6158820109), (19, 56))
            Line((19, 56), (-19, 56))
        make_face()
        with BuildLine():
            Line((-19, 10), (-19, 15.3841179891))
            ThreePointArc((-19, 15.3841179891), (-23.3298247558, 33), (-19, 50.6158820109))
            Line((-19, 50.6158820109), (-19, 56))
            ThreePointArc((-19, 56), (-23.2866263695, 49.1909963748), (-26, 41.6163478984))
            Line((-26, 41.6163478984), (-26, 24.3836521016))
            ThreePointArc((-26, 24.3836521016), (-23.2866263695, 16.8090036252), (-19, 10))
        make_face()
        with BuildLine():
            Line((17, 12), (-17, 12))
            ThreePointArc((-17, 12), (-18.0437883513, 13.6661802566), (-19, 15.3841179891))
            Line((-19, 15.3841179891), (-19, 10))
            Line((-19, 10), (19, 10))
            Line((19, 10), (19, 15.3841179891))
            ThreePointArc((19, 15.3841179891), (18.0437883513, 13.6661802566), (17, 12))
        make_face()
    extrude(amount=F21_DEPTH)

    # F22 (on face) → F23 (join)
    with BuildSketch(Plane.YZ.offset(26)):
        Polygon((-76, -36), (-76, -74.5), (-69, -74.5), (-59, -36), align=None)
        with Locations((-77.5, -55.25)):
            Rectangle(F22_W, F22_H)
    extrude(amount=-F23_DEPTH)

    # F25 (on face) → F26 (join)
    with BuildSketch(Plane(origin=(0, 0, -74.5), x_dir=(1, 0, 0), z_dir=(0, 0, -1))):
        with BuildLine():
            Line((37, 74), (26, 74))
            Line((26, 74), (21, 74))
            Line((21, 74), (-26, 74))
            Line((-26, 74), (-37, 74))
            ThreePointArc((-37, 74), (-42, 69), (-37, 64))
            Line((-37, 64), (37, 64))
            ThreePointArc((37, 64), (42, 69), (37, 74))
        make_face()
        with Locations((-37, 69)):
            Circle(F25_R, mode=Mode.SUBTRACT)
        with Locations((0, 69)):
            Circle(F25_R, mode=Mode.SUBTRACT)
        with Locations((37, 69)):
            Circle(F25_R, mode=Mode.SUBTRACT)
        Polygon((26, 79), (-26, 79), (-26, 76), (21, 76), (21, 74), (26, 74), align=None)
        with Locations((-2.5, 75)):
            Rectangle(F25_W, F25_H)
        with BuildLine():
            Line((-26.0336585343, 79), (-26, 79))
            Line((-26, 79), (26, 79))
            Line((26, 79), (26, 84))
            ThreePointArc((26, 84), (24.5355339059, 87.5355339059), (21, 89))
            Line((21, 89), (-21.0336585343, 89))
            ThreePointArc((-21.0336585343, 89), (-24.5691924402, 87.5355339059), (-26.0336585343, 84))
            Line((-26.0336585343, 84), (-26.0336585343, 79))
        make_face()
        with Locations((0, 84)):
            Circle(F25_R, mode=Mode.SUBTRACT)
    extrude(amount=-F26_DEPTH)

    # F27 (add): faces of the model
    f27_faces = [f1.faces().sort_by_distance(p)[0] for p in [
        (23.5, -77.5, -74.5),
        (-2.5, -77.5, -74.5),
        (23.5, -72.5, -74.5),
        (-26.0168292671, -79.5298586246, -74.5),
        (-41.1514718626, -69, -74.5),
    ]]
    extrude(f27_faces, amount=F27_DEPTH)

    # F28 (on face) → F29 (cut)
    with BuildSketch(Plane.YZ.offset(36)):
        with BuildLine():
            Line((-78, 5), (-79, 5))
            Line((-79, 5), (-79, -22))
            Line((-79, -22), (-78, -22))
            ThreePointArc((-78, -22), (-74.4644660941, -20.5355339059), (-73, -17))
            Line((-73, -17), (-73, 0))
            ThreePointArc((-73, 0), (-74.4644660941, 3.5355339059), (-78, 5))
        make_face()
    extrude(amount=-F29_DEPTH, mode=Mode.SUBTRACT)

    # F30 (add): a face of the model
    f30_faces = [f1.faces().sort_by_distance(p)[0] for p in [
        (-0.0056811519, -75.1326620312, -75.5),
    ]]
    extrude(f30_faces, amount=F30_DEPTH)

    # F24 (on face) → F31 (join)
    with BuildSketch(Plane(origin=(-26, 0, 0), x_dir=(0, -1, 0), z_dir=(-1, 0, 0))):
        with Locations((77.5, -55.25)):
            Rectangle(F24_W, F24_H)
        Polygon((69, -74.5), (76, -74.5), (76, -36), (59, -36), align=None)
    extrude(amount=-F31_DEPTH)

    # F32 (on face) → F33 (cut)
    with BuildSketch(Plane.YZ.offset(36)):
        with Locations((-36.2, 0)):
            Circle(F32_R)
    extrude(amount=-F33_DEPTH, mode=Mode.SUBTRACT)


solid = f1.part
